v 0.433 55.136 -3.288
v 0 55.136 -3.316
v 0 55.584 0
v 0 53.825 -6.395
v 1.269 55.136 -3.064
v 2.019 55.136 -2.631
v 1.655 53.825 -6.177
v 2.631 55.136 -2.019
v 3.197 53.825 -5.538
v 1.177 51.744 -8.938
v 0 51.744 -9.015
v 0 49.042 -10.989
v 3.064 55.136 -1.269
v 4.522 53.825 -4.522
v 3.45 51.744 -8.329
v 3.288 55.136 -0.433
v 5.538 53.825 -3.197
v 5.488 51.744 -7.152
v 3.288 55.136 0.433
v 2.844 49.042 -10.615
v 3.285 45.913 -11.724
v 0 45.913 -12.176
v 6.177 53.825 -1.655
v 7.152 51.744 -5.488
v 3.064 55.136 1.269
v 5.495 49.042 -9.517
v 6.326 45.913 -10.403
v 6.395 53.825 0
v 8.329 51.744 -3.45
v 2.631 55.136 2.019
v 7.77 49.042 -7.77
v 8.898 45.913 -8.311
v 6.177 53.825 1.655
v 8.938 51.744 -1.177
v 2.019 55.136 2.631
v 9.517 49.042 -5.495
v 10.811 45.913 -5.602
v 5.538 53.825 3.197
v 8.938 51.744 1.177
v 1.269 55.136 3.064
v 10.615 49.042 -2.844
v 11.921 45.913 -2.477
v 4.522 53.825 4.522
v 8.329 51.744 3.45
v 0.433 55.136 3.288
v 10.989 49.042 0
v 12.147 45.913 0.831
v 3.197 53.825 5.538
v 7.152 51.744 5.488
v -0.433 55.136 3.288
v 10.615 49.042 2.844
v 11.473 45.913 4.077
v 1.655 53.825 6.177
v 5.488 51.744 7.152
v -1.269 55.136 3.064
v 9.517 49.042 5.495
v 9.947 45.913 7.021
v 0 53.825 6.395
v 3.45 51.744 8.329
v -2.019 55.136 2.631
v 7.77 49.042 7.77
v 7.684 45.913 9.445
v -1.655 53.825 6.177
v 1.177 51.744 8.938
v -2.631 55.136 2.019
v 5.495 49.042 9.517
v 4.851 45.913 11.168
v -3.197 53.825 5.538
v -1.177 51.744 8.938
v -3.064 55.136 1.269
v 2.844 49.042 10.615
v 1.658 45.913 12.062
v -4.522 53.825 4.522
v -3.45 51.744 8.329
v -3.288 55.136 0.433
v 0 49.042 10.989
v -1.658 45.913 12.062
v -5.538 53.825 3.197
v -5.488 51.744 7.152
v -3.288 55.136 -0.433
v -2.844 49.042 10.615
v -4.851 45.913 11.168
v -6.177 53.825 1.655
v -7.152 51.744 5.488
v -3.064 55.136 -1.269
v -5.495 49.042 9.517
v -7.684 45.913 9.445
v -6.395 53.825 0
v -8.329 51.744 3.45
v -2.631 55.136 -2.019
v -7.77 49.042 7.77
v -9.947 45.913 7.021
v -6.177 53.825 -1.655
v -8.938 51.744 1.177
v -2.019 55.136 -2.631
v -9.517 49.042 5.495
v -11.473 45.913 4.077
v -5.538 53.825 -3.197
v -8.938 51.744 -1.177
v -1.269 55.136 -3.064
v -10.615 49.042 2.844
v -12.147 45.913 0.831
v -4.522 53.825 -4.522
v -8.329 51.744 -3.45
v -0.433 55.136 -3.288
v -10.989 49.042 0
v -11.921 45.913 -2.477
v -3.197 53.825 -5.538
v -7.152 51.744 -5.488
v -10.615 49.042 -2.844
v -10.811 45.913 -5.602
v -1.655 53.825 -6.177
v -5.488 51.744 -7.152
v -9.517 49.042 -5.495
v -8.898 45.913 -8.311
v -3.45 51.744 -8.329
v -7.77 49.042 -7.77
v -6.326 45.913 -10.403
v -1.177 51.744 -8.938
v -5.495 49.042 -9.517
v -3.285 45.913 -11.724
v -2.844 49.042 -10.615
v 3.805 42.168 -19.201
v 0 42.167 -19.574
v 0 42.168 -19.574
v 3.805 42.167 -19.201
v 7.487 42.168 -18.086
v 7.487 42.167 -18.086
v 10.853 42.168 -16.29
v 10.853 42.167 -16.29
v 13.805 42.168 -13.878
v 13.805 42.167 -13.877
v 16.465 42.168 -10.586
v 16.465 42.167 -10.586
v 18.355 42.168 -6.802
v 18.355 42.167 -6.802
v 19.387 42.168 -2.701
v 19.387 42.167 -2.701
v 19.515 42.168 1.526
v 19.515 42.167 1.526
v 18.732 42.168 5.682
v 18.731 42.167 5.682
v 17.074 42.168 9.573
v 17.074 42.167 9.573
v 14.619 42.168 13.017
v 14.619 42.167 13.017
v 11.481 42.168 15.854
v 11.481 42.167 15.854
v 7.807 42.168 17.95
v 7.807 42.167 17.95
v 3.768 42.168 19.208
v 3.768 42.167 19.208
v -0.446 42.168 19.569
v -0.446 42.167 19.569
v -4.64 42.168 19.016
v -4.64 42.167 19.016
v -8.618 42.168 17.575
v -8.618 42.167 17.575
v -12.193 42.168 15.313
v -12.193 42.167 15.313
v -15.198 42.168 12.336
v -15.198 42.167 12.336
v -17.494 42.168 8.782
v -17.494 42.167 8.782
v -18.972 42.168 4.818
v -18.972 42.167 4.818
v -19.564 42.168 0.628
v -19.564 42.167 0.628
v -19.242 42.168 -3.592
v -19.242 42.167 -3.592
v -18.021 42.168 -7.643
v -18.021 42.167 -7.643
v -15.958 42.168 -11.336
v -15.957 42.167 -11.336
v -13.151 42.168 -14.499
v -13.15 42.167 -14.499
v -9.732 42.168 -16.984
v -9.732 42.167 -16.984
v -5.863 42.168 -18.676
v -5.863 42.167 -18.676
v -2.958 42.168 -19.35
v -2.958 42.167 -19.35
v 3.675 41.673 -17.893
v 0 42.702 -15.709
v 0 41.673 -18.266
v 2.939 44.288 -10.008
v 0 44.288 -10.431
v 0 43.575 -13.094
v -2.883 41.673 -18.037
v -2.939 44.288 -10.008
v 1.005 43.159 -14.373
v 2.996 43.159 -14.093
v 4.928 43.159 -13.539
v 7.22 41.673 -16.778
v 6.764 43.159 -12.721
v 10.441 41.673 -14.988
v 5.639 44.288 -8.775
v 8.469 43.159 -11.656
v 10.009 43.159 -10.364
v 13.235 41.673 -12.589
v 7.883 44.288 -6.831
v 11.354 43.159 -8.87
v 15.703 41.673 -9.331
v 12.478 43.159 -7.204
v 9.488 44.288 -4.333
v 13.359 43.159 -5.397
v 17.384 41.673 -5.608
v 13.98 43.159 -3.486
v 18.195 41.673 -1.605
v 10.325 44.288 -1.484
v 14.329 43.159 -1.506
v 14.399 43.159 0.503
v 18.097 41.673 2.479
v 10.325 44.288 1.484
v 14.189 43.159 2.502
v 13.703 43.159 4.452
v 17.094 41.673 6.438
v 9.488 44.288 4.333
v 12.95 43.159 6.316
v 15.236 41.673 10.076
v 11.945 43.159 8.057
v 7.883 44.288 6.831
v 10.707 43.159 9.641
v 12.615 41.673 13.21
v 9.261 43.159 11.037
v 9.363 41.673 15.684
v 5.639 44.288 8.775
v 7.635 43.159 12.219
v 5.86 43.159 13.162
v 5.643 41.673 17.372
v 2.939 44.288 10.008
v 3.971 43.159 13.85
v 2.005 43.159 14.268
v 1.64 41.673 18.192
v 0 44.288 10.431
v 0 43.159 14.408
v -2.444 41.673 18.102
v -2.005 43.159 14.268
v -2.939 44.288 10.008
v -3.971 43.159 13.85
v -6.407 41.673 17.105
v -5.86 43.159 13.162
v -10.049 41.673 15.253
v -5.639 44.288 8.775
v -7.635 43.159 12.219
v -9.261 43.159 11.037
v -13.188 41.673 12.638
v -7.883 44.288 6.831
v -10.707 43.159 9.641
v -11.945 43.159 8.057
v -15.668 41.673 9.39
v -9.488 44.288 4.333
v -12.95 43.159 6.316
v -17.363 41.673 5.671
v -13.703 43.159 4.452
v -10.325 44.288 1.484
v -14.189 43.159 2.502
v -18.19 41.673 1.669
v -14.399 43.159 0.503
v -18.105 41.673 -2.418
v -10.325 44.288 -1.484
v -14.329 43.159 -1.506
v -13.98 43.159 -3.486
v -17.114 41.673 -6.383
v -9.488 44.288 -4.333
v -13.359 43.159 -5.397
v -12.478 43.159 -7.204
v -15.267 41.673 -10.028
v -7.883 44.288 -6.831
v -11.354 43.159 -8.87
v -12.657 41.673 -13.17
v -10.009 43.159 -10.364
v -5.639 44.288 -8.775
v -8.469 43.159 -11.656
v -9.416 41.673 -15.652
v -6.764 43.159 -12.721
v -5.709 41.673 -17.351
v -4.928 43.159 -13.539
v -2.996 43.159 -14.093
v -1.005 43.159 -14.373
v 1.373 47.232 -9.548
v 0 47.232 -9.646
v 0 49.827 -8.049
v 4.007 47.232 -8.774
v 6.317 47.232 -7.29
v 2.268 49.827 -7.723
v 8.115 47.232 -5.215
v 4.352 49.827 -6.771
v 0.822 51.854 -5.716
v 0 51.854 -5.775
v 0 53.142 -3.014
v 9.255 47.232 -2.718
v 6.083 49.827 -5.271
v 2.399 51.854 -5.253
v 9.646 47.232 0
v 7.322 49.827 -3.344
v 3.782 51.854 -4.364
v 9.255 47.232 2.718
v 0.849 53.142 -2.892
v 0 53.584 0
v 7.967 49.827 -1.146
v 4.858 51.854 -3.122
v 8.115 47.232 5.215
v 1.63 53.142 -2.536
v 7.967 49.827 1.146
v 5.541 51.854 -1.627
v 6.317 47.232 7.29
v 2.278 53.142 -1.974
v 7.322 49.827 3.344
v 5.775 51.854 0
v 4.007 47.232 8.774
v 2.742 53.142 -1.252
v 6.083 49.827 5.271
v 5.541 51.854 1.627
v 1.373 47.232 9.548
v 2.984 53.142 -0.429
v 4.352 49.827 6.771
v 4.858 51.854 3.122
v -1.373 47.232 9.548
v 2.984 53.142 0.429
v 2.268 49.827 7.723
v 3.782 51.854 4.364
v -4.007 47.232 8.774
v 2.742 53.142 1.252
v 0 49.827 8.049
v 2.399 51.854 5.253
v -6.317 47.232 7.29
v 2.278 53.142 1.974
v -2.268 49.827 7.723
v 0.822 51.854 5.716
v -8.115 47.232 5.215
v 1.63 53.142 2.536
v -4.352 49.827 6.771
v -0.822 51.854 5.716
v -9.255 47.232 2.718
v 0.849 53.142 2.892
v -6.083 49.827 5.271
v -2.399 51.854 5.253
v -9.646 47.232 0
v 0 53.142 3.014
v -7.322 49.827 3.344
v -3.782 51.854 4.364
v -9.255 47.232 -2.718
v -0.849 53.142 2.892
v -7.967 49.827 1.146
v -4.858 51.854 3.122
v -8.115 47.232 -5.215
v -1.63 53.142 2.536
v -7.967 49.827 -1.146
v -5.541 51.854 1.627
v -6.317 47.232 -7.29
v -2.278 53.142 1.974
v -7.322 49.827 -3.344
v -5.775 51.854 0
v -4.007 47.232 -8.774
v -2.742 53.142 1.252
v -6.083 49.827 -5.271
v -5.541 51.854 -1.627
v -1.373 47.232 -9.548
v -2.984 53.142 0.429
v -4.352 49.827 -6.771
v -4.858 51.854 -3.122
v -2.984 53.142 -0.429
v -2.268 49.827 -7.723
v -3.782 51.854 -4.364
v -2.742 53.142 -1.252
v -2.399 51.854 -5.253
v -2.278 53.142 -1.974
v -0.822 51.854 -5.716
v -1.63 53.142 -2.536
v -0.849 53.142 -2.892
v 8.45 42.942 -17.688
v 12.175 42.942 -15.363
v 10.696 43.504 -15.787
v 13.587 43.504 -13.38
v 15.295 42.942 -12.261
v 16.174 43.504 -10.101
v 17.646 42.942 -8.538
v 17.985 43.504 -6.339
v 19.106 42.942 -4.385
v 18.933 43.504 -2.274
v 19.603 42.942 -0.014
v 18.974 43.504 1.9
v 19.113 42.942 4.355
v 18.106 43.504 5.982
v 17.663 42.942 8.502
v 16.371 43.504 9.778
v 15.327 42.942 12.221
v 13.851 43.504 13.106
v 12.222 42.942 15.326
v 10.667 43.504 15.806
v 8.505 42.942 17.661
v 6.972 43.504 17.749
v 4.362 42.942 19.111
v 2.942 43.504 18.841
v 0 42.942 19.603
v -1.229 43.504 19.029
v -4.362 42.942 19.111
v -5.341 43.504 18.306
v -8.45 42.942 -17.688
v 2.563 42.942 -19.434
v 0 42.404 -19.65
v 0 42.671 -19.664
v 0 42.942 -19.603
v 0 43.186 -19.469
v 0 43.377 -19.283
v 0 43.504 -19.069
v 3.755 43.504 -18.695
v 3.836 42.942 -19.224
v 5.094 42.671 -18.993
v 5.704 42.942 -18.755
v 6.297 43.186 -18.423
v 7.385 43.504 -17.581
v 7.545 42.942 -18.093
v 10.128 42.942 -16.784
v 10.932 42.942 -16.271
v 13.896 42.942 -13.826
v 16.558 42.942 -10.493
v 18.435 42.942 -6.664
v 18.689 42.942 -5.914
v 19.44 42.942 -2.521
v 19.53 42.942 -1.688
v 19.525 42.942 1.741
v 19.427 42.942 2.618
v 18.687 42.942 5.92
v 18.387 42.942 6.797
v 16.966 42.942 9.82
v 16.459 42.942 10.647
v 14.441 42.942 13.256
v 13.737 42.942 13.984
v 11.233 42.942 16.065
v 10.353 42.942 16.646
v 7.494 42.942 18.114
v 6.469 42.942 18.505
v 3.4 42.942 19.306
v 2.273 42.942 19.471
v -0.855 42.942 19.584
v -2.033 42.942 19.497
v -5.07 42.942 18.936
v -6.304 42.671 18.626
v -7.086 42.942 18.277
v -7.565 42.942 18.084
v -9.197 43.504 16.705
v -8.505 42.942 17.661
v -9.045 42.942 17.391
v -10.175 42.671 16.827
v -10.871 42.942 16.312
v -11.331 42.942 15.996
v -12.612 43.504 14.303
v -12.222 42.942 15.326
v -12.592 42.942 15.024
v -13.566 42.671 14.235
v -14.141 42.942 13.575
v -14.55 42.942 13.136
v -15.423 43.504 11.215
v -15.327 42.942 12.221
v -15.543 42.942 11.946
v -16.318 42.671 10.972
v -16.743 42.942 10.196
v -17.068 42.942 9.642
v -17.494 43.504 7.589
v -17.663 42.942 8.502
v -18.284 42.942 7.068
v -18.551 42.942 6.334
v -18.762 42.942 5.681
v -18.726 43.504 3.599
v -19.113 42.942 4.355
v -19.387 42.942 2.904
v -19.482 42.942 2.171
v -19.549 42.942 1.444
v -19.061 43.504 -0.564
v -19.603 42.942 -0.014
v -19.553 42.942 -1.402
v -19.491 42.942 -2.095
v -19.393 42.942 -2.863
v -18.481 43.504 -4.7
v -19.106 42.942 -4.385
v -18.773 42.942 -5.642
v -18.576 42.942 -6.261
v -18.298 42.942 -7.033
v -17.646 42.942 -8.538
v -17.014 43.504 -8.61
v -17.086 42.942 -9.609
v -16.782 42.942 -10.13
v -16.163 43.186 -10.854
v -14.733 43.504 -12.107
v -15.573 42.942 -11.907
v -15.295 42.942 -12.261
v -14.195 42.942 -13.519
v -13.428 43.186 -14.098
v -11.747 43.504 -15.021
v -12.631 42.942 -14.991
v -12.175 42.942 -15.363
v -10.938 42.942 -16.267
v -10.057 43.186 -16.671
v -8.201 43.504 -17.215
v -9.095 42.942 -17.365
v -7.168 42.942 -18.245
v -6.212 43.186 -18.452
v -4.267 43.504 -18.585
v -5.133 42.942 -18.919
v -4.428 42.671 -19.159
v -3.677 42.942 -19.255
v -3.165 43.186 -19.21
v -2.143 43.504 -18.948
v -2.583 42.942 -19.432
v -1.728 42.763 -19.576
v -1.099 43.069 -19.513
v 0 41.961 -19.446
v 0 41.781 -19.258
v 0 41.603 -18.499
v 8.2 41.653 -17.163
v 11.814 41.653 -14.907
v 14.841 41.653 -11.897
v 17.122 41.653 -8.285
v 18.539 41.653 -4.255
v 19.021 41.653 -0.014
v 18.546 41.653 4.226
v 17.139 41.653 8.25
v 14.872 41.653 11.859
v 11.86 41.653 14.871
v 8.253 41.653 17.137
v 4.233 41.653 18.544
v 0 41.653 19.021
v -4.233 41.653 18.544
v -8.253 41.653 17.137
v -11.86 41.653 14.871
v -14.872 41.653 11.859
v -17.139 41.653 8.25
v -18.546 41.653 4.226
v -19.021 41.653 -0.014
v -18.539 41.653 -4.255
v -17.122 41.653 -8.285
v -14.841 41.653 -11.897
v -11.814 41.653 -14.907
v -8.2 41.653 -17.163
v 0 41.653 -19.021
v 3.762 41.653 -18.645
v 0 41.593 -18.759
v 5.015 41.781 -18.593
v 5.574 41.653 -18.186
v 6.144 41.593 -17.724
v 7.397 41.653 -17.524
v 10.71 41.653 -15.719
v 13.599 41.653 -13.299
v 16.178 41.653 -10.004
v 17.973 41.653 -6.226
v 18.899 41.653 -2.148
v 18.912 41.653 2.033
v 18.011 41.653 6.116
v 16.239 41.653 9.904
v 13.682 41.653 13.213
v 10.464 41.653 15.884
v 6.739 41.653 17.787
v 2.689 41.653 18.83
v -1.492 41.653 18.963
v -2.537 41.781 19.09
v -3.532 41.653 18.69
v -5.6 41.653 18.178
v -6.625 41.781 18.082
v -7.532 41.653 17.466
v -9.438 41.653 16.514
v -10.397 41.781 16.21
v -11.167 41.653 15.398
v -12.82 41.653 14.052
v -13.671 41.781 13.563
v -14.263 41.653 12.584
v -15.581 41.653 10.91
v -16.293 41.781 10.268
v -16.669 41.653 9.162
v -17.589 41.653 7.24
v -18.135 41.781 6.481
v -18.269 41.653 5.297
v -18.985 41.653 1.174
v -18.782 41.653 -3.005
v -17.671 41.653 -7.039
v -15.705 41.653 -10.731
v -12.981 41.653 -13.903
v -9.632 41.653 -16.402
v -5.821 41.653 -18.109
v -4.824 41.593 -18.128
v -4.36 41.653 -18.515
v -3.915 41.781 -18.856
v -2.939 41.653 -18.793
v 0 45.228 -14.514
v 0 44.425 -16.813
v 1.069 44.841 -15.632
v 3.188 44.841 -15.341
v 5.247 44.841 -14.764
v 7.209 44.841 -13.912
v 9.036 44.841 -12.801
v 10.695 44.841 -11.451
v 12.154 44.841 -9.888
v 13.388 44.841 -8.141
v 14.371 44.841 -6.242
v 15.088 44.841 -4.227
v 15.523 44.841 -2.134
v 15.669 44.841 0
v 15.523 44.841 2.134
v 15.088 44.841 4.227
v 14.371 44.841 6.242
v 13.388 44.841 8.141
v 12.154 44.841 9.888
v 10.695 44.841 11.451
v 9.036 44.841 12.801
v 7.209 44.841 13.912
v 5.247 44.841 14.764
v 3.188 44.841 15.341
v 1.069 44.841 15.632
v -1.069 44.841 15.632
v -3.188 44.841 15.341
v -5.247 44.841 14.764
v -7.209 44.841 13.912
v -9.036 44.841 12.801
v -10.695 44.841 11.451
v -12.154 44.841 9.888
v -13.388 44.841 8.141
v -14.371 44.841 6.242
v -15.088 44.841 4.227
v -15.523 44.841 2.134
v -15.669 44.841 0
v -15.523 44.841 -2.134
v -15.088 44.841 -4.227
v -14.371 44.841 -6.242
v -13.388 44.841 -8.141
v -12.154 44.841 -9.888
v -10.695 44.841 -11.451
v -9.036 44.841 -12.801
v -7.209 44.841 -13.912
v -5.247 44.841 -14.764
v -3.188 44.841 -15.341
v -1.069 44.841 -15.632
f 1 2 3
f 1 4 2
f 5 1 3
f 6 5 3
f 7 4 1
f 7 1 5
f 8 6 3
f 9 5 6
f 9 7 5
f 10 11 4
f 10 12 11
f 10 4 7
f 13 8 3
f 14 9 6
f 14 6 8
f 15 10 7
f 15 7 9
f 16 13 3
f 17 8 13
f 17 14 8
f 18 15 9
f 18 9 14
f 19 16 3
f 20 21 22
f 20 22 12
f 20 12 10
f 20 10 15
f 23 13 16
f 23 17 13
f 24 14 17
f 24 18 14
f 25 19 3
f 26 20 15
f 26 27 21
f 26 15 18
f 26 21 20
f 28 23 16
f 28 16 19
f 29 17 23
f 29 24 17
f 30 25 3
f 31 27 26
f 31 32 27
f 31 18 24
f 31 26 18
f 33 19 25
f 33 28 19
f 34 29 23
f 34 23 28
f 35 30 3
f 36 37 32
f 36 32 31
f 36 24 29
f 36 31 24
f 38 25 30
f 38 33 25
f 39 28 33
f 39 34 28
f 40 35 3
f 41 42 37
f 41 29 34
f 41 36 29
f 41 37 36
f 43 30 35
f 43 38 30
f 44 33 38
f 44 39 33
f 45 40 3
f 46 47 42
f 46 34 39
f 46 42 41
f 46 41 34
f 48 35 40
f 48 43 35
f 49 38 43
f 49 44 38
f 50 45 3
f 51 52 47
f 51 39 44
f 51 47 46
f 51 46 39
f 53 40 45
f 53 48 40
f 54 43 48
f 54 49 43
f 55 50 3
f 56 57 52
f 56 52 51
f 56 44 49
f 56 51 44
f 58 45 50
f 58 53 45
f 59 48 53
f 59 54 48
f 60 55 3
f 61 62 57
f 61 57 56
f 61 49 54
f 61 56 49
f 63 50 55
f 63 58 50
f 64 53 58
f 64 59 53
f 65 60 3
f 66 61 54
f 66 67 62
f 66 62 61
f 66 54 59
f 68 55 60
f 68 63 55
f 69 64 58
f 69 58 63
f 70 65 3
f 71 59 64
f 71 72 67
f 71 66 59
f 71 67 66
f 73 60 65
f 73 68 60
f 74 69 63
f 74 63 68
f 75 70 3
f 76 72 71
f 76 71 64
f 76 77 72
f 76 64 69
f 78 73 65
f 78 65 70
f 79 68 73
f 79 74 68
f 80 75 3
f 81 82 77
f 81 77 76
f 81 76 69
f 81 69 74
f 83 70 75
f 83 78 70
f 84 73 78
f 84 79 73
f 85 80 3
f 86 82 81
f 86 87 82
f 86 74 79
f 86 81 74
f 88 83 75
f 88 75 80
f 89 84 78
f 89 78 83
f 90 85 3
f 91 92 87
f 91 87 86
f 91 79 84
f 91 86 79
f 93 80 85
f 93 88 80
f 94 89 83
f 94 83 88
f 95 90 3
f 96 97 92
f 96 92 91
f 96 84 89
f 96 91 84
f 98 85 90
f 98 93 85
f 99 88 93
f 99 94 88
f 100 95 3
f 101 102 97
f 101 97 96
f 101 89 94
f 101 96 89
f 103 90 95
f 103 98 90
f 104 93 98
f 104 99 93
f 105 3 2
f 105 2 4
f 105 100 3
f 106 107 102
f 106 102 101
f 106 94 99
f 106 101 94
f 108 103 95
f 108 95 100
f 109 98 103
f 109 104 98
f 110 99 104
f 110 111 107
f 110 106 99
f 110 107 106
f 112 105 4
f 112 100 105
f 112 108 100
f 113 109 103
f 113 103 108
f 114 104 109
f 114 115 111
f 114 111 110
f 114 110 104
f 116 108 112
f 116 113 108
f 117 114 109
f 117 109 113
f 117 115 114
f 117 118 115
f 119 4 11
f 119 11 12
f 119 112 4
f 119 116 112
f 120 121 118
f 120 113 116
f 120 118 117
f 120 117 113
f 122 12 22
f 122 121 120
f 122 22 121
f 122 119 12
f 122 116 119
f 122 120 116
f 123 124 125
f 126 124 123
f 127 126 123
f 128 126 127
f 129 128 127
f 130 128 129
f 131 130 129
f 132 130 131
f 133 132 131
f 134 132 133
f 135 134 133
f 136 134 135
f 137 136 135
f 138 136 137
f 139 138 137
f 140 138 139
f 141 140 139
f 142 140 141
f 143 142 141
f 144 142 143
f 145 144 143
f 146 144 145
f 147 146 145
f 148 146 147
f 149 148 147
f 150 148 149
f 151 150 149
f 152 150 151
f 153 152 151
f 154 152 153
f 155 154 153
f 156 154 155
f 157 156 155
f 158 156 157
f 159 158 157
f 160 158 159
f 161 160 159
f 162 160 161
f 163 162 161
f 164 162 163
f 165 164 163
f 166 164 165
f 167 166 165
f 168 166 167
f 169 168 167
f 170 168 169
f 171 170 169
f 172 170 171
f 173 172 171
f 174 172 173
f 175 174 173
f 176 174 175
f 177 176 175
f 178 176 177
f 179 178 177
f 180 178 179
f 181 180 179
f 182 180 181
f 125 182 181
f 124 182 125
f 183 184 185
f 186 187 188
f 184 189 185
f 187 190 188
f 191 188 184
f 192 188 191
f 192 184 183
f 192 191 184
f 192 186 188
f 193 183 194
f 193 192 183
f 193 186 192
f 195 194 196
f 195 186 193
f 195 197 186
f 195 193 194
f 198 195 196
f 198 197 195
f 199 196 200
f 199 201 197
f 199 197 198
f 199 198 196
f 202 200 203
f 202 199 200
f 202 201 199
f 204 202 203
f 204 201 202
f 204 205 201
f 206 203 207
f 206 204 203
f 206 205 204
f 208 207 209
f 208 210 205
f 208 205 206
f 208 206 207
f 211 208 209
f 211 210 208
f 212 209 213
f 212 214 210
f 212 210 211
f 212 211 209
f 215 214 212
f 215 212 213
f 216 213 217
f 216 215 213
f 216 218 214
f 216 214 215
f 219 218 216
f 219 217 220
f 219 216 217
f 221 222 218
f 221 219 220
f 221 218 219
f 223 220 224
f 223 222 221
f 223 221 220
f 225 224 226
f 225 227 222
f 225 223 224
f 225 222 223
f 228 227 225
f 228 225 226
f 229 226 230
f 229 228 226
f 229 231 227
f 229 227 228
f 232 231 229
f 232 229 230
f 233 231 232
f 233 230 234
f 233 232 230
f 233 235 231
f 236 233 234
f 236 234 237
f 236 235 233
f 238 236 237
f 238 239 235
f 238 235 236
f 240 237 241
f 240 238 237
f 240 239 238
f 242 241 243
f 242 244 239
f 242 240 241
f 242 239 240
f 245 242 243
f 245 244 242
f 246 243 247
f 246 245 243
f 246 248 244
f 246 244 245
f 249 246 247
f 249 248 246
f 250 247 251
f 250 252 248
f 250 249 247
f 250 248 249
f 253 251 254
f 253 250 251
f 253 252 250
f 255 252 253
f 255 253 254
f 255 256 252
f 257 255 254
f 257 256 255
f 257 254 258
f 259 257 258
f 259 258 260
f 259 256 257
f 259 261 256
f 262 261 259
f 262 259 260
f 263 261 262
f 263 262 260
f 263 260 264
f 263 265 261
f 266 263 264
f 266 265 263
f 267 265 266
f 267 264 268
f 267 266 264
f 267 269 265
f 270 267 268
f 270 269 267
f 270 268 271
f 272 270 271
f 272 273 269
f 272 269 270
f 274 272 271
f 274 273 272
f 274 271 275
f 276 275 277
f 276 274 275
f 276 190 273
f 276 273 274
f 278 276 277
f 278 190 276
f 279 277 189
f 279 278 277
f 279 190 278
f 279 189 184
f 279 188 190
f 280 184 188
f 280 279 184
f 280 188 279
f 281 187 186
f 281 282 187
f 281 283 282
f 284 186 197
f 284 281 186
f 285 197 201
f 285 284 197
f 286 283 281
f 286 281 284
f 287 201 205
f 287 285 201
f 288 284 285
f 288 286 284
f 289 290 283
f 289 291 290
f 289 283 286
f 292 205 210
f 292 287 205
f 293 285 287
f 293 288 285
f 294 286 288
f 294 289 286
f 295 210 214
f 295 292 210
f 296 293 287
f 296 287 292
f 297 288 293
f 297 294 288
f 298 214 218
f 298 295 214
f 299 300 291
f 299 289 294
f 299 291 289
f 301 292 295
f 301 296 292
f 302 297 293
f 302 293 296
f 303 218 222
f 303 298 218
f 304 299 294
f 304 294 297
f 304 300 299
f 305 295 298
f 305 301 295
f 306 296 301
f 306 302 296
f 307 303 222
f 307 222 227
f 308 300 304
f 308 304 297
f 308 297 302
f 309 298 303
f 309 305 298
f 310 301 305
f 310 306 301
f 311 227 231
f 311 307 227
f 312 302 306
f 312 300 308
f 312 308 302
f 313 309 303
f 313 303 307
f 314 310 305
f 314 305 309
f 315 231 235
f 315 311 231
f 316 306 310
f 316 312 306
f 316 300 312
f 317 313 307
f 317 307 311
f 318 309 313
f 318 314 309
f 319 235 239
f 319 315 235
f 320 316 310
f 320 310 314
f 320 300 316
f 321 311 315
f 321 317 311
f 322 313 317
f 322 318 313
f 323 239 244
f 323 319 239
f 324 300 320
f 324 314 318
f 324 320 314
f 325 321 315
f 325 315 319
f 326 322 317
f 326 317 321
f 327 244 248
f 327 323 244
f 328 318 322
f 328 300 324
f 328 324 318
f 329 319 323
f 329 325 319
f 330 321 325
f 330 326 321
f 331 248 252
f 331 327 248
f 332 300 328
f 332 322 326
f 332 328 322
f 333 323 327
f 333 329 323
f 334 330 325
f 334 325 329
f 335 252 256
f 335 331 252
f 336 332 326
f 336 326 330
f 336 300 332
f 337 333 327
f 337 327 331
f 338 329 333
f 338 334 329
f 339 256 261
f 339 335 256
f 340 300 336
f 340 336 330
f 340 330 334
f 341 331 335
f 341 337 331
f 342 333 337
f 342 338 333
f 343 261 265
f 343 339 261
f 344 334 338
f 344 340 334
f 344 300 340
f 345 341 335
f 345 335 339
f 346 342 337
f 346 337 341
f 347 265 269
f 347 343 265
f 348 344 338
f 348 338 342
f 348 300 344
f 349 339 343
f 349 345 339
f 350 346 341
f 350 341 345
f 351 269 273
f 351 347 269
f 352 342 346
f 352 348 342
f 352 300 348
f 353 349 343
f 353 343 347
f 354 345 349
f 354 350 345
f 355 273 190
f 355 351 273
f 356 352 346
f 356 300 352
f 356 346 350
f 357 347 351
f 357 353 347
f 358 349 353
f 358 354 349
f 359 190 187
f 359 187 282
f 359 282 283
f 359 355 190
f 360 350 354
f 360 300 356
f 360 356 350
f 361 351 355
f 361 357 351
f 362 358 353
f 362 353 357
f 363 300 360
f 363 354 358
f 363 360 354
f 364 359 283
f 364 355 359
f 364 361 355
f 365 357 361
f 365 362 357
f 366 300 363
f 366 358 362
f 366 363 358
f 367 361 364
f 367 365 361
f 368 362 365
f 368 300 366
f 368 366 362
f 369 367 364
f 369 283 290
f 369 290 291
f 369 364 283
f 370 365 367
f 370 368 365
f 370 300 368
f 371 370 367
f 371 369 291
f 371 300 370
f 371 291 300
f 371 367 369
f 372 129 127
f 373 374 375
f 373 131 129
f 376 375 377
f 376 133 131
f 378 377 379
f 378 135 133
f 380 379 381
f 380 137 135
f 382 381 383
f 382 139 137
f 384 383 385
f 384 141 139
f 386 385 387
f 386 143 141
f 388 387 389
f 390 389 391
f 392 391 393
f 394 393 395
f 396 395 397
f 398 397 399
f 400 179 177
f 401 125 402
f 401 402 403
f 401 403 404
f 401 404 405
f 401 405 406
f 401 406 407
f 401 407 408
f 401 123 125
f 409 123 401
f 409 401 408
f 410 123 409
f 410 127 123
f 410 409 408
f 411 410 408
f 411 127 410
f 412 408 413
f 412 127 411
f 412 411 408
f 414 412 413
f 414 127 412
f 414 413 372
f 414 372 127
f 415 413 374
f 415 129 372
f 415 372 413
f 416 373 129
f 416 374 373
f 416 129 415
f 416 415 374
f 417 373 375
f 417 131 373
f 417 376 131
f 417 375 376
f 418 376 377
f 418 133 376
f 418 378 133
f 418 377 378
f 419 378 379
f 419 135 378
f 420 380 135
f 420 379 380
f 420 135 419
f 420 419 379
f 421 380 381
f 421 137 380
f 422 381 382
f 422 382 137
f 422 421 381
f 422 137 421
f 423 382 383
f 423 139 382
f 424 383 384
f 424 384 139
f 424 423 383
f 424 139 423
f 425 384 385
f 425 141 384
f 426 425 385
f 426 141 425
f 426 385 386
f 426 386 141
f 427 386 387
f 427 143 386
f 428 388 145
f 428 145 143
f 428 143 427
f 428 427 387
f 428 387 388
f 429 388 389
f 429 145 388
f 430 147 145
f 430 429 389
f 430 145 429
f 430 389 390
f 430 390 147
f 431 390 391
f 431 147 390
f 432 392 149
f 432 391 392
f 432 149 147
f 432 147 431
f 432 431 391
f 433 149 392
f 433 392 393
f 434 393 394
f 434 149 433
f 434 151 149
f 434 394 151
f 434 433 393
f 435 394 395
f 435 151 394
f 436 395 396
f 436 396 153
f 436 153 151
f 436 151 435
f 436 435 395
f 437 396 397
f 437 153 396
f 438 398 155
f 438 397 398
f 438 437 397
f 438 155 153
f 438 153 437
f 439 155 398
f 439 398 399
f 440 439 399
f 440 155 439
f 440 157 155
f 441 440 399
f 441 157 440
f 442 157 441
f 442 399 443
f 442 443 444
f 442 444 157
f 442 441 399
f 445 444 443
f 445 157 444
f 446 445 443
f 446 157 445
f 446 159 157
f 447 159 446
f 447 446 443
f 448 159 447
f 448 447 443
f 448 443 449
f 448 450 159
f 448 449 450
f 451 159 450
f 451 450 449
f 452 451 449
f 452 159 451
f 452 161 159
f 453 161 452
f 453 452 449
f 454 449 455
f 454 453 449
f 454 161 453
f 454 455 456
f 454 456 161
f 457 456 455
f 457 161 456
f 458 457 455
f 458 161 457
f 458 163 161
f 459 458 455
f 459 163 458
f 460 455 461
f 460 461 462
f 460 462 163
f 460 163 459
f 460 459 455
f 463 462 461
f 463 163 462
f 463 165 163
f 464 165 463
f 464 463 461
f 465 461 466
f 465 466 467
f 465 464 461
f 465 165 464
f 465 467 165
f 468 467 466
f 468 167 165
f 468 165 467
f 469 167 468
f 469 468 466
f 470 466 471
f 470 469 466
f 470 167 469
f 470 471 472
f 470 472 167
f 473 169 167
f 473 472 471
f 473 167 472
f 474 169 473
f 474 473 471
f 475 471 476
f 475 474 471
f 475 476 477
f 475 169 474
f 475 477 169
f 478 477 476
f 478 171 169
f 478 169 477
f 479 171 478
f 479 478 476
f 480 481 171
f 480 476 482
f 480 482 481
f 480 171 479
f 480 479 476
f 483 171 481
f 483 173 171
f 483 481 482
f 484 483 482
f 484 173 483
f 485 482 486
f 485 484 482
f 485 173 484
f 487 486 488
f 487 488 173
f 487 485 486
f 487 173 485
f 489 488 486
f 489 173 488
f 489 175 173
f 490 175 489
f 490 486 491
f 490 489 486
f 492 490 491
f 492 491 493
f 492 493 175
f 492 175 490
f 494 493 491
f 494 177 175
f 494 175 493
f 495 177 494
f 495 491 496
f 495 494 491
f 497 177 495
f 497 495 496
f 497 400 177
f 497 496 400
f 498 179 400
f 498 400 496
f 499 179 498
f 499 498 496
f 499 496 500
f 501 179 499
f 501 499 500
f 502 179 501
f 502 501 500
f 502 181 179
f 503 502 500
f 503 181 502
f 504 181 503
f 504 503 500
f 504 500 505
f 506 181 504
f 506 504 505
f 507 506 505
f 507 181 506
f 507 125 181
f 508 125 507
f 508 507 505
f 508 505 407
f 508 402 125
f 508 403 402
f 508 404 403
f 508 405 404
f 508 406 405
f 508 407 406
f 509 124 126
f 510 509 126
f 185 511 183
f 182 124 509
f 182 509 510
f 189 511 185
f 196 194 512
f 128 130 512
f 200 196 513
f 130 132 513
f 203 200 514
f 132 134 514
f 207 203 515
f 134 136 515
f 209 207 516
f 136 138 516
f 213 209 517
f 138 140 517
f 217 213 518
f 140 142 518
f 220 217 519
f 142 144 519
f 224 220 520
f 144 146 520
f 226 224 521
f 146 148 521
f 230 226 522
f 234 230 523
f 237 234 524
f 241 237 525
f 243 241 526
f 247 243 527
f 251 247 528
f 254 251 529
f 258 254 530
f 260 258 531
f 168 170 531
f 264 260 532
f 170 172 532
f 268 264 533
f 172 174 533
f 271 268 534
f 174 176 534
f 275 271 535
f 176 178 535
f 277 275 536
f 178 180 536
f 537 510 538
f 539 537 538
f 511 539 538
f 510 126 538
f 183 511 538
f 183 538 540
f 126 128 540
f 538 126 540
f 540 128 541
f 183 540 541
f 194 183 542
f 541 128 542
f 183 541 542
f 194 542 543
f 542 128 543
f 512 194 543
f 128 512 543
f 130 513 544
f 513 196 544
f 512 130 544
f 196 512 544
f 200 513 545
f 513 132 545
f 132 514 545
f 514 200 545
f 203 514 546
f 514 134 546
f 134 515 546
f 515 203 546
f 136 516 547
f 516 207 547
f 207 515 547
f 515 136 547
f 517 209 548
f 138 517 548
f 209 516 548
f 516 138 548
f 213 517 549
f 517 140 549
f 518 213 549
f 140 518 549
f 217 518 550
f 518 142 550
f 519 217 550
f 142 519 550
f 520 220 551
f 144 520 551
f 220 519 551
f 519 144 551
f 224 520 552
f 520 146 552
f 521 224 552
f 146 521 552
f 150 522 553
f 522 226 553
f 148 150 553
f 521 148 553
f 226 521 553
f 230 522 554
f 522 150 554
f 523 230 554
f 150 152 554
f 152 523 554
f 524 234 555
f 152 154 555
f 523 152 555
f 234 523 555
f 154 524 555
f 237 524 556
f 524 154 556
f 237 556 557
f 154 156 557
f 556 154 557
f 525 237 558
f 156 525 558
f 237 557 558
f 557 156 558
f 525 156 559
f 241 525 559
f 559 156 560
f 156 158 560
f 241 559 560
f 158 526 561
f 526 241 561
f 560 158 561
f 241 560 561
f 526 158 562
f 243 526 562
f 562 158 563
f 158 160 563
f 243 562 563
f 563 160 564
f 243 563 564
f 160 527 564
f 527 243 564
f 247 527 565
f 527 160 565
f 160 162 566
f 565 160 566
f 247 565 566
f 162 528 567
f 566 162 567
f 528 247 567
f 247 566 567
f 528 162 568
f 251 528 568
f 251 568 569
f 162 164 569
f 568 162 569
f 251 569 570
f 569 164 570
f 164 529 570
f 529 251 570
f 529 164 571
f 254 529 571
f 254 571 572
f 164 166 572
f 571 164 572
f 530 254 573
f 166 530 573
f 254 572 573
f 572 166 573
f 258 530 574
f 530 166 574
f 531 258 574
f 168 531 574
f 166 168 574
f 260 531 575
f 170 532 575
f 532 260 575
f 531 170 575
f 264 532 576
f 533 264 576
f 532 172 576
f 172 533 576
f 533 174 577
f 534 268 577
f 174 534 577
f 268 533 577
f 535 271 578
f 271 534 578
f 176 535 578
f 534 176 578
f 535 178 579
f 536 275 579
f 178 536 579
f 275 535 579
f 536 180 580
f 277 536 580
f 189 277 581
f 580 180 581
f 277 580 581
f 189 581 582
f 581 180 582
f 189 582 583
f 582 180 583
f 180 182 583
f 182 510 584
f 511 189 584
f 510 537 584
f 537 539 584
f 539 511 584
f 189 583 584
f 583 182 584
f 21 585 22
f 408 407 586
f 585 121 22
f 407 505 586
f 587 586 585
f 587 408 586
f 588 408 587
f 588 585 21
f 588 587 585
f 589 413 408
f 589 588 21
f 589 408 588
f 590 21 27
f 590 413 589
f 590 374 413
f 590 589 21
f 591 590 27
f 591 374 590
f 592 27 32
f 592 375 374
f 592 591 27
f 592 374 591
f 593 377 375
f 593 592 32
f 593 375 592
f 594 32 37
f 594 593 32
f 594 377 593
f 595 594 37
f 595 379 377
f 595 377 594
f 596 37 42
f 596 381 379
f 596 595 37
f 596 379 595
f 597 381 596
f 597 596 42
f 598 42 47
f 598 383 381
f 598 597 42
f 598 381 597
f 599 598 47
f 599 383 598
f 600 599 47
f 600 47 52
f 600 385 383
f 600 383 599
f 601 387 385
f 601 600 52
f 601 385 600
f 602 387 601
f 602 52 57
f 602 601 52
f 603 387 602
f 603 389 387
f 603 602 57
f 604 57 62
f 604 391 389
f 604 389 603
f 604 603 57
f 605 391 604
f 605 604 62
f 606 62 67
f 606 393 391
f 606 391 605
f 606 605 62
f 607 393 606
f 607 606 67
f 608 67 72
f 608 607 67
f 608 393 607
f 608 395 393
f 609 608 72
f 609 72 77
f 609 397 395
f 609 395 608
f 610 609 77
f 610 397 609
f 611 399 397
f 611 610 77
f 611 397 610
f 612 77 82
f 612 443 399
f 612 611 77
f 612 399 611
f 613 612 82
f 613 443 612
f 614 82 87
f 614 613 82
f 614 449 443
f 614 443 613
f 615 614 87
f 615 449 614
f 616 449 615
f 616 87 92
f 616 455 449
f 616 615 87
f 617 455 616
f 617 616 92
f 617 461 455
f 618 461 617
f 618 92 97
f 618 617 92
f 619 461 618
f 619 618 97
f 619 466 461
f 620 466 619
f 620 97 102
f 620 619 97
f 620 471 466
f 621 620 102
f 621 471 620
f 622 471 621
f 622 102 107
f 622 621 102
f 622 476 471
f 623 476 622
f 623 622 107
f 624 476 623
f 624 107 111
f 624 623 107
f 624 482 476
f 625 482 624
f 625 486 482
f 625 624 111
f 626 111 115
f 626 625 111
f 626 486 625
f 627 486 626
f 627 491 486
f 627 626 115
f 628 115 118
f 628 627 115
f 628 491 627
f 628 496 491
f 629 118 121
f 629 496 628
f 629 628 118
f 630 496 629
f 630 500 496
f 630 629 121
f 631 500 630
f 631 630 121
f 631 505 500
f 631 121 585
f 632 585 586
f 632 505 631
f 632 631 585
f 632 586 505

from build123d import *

# Parameters (mm, degrees)
FILLET1_R = 1


with BuildPart() as part:
    # Sketch2 → Revolve2 (revolve)
    with BuildSketch(Plane(origin=(0, 0, 0), x_dir=(0, 0, -1), z_dir=(1, 0, 0))):
        with BuildLine():
            Line((20, 43.084219849), (19.157894737, 41.270147434))
            ThreePointArc((19.157894737, 41.270147434), (14.87108075, 43.001173906), (10.430737971, 44.288256969))
            ThreePointArc((10.430737971, 44.288256969), (6.985972024, 50.92298218), (0, 53.584219849))
            Line((0, 53.584219849), (0, 55.584219849))
            ThreePointArc((0, 55.584219849), (7.774653566, 52.872210549), (12.175717887, 45.912981758))
            ThreePointArc((12.175717887, 45.912981758), (16.149912658, 44.67023977), (20, 43.084219849))
        make_face()
    revolve(axis=Axis((0, 55.584219849, 0), (0, -1, 0)))

    # Fillet1
    fillet1_edges = [part.edges().sort_by_distance(p)[0] for p in [
        (0, 43.084219849, 20),
        (0, 41.270147434, 19.157894737),
    ]]
    fillet(fillet1_edges, radius=FILLET1_R - 0.0001)  # a hair under: the kernel refuses the full size


solid = part.part
